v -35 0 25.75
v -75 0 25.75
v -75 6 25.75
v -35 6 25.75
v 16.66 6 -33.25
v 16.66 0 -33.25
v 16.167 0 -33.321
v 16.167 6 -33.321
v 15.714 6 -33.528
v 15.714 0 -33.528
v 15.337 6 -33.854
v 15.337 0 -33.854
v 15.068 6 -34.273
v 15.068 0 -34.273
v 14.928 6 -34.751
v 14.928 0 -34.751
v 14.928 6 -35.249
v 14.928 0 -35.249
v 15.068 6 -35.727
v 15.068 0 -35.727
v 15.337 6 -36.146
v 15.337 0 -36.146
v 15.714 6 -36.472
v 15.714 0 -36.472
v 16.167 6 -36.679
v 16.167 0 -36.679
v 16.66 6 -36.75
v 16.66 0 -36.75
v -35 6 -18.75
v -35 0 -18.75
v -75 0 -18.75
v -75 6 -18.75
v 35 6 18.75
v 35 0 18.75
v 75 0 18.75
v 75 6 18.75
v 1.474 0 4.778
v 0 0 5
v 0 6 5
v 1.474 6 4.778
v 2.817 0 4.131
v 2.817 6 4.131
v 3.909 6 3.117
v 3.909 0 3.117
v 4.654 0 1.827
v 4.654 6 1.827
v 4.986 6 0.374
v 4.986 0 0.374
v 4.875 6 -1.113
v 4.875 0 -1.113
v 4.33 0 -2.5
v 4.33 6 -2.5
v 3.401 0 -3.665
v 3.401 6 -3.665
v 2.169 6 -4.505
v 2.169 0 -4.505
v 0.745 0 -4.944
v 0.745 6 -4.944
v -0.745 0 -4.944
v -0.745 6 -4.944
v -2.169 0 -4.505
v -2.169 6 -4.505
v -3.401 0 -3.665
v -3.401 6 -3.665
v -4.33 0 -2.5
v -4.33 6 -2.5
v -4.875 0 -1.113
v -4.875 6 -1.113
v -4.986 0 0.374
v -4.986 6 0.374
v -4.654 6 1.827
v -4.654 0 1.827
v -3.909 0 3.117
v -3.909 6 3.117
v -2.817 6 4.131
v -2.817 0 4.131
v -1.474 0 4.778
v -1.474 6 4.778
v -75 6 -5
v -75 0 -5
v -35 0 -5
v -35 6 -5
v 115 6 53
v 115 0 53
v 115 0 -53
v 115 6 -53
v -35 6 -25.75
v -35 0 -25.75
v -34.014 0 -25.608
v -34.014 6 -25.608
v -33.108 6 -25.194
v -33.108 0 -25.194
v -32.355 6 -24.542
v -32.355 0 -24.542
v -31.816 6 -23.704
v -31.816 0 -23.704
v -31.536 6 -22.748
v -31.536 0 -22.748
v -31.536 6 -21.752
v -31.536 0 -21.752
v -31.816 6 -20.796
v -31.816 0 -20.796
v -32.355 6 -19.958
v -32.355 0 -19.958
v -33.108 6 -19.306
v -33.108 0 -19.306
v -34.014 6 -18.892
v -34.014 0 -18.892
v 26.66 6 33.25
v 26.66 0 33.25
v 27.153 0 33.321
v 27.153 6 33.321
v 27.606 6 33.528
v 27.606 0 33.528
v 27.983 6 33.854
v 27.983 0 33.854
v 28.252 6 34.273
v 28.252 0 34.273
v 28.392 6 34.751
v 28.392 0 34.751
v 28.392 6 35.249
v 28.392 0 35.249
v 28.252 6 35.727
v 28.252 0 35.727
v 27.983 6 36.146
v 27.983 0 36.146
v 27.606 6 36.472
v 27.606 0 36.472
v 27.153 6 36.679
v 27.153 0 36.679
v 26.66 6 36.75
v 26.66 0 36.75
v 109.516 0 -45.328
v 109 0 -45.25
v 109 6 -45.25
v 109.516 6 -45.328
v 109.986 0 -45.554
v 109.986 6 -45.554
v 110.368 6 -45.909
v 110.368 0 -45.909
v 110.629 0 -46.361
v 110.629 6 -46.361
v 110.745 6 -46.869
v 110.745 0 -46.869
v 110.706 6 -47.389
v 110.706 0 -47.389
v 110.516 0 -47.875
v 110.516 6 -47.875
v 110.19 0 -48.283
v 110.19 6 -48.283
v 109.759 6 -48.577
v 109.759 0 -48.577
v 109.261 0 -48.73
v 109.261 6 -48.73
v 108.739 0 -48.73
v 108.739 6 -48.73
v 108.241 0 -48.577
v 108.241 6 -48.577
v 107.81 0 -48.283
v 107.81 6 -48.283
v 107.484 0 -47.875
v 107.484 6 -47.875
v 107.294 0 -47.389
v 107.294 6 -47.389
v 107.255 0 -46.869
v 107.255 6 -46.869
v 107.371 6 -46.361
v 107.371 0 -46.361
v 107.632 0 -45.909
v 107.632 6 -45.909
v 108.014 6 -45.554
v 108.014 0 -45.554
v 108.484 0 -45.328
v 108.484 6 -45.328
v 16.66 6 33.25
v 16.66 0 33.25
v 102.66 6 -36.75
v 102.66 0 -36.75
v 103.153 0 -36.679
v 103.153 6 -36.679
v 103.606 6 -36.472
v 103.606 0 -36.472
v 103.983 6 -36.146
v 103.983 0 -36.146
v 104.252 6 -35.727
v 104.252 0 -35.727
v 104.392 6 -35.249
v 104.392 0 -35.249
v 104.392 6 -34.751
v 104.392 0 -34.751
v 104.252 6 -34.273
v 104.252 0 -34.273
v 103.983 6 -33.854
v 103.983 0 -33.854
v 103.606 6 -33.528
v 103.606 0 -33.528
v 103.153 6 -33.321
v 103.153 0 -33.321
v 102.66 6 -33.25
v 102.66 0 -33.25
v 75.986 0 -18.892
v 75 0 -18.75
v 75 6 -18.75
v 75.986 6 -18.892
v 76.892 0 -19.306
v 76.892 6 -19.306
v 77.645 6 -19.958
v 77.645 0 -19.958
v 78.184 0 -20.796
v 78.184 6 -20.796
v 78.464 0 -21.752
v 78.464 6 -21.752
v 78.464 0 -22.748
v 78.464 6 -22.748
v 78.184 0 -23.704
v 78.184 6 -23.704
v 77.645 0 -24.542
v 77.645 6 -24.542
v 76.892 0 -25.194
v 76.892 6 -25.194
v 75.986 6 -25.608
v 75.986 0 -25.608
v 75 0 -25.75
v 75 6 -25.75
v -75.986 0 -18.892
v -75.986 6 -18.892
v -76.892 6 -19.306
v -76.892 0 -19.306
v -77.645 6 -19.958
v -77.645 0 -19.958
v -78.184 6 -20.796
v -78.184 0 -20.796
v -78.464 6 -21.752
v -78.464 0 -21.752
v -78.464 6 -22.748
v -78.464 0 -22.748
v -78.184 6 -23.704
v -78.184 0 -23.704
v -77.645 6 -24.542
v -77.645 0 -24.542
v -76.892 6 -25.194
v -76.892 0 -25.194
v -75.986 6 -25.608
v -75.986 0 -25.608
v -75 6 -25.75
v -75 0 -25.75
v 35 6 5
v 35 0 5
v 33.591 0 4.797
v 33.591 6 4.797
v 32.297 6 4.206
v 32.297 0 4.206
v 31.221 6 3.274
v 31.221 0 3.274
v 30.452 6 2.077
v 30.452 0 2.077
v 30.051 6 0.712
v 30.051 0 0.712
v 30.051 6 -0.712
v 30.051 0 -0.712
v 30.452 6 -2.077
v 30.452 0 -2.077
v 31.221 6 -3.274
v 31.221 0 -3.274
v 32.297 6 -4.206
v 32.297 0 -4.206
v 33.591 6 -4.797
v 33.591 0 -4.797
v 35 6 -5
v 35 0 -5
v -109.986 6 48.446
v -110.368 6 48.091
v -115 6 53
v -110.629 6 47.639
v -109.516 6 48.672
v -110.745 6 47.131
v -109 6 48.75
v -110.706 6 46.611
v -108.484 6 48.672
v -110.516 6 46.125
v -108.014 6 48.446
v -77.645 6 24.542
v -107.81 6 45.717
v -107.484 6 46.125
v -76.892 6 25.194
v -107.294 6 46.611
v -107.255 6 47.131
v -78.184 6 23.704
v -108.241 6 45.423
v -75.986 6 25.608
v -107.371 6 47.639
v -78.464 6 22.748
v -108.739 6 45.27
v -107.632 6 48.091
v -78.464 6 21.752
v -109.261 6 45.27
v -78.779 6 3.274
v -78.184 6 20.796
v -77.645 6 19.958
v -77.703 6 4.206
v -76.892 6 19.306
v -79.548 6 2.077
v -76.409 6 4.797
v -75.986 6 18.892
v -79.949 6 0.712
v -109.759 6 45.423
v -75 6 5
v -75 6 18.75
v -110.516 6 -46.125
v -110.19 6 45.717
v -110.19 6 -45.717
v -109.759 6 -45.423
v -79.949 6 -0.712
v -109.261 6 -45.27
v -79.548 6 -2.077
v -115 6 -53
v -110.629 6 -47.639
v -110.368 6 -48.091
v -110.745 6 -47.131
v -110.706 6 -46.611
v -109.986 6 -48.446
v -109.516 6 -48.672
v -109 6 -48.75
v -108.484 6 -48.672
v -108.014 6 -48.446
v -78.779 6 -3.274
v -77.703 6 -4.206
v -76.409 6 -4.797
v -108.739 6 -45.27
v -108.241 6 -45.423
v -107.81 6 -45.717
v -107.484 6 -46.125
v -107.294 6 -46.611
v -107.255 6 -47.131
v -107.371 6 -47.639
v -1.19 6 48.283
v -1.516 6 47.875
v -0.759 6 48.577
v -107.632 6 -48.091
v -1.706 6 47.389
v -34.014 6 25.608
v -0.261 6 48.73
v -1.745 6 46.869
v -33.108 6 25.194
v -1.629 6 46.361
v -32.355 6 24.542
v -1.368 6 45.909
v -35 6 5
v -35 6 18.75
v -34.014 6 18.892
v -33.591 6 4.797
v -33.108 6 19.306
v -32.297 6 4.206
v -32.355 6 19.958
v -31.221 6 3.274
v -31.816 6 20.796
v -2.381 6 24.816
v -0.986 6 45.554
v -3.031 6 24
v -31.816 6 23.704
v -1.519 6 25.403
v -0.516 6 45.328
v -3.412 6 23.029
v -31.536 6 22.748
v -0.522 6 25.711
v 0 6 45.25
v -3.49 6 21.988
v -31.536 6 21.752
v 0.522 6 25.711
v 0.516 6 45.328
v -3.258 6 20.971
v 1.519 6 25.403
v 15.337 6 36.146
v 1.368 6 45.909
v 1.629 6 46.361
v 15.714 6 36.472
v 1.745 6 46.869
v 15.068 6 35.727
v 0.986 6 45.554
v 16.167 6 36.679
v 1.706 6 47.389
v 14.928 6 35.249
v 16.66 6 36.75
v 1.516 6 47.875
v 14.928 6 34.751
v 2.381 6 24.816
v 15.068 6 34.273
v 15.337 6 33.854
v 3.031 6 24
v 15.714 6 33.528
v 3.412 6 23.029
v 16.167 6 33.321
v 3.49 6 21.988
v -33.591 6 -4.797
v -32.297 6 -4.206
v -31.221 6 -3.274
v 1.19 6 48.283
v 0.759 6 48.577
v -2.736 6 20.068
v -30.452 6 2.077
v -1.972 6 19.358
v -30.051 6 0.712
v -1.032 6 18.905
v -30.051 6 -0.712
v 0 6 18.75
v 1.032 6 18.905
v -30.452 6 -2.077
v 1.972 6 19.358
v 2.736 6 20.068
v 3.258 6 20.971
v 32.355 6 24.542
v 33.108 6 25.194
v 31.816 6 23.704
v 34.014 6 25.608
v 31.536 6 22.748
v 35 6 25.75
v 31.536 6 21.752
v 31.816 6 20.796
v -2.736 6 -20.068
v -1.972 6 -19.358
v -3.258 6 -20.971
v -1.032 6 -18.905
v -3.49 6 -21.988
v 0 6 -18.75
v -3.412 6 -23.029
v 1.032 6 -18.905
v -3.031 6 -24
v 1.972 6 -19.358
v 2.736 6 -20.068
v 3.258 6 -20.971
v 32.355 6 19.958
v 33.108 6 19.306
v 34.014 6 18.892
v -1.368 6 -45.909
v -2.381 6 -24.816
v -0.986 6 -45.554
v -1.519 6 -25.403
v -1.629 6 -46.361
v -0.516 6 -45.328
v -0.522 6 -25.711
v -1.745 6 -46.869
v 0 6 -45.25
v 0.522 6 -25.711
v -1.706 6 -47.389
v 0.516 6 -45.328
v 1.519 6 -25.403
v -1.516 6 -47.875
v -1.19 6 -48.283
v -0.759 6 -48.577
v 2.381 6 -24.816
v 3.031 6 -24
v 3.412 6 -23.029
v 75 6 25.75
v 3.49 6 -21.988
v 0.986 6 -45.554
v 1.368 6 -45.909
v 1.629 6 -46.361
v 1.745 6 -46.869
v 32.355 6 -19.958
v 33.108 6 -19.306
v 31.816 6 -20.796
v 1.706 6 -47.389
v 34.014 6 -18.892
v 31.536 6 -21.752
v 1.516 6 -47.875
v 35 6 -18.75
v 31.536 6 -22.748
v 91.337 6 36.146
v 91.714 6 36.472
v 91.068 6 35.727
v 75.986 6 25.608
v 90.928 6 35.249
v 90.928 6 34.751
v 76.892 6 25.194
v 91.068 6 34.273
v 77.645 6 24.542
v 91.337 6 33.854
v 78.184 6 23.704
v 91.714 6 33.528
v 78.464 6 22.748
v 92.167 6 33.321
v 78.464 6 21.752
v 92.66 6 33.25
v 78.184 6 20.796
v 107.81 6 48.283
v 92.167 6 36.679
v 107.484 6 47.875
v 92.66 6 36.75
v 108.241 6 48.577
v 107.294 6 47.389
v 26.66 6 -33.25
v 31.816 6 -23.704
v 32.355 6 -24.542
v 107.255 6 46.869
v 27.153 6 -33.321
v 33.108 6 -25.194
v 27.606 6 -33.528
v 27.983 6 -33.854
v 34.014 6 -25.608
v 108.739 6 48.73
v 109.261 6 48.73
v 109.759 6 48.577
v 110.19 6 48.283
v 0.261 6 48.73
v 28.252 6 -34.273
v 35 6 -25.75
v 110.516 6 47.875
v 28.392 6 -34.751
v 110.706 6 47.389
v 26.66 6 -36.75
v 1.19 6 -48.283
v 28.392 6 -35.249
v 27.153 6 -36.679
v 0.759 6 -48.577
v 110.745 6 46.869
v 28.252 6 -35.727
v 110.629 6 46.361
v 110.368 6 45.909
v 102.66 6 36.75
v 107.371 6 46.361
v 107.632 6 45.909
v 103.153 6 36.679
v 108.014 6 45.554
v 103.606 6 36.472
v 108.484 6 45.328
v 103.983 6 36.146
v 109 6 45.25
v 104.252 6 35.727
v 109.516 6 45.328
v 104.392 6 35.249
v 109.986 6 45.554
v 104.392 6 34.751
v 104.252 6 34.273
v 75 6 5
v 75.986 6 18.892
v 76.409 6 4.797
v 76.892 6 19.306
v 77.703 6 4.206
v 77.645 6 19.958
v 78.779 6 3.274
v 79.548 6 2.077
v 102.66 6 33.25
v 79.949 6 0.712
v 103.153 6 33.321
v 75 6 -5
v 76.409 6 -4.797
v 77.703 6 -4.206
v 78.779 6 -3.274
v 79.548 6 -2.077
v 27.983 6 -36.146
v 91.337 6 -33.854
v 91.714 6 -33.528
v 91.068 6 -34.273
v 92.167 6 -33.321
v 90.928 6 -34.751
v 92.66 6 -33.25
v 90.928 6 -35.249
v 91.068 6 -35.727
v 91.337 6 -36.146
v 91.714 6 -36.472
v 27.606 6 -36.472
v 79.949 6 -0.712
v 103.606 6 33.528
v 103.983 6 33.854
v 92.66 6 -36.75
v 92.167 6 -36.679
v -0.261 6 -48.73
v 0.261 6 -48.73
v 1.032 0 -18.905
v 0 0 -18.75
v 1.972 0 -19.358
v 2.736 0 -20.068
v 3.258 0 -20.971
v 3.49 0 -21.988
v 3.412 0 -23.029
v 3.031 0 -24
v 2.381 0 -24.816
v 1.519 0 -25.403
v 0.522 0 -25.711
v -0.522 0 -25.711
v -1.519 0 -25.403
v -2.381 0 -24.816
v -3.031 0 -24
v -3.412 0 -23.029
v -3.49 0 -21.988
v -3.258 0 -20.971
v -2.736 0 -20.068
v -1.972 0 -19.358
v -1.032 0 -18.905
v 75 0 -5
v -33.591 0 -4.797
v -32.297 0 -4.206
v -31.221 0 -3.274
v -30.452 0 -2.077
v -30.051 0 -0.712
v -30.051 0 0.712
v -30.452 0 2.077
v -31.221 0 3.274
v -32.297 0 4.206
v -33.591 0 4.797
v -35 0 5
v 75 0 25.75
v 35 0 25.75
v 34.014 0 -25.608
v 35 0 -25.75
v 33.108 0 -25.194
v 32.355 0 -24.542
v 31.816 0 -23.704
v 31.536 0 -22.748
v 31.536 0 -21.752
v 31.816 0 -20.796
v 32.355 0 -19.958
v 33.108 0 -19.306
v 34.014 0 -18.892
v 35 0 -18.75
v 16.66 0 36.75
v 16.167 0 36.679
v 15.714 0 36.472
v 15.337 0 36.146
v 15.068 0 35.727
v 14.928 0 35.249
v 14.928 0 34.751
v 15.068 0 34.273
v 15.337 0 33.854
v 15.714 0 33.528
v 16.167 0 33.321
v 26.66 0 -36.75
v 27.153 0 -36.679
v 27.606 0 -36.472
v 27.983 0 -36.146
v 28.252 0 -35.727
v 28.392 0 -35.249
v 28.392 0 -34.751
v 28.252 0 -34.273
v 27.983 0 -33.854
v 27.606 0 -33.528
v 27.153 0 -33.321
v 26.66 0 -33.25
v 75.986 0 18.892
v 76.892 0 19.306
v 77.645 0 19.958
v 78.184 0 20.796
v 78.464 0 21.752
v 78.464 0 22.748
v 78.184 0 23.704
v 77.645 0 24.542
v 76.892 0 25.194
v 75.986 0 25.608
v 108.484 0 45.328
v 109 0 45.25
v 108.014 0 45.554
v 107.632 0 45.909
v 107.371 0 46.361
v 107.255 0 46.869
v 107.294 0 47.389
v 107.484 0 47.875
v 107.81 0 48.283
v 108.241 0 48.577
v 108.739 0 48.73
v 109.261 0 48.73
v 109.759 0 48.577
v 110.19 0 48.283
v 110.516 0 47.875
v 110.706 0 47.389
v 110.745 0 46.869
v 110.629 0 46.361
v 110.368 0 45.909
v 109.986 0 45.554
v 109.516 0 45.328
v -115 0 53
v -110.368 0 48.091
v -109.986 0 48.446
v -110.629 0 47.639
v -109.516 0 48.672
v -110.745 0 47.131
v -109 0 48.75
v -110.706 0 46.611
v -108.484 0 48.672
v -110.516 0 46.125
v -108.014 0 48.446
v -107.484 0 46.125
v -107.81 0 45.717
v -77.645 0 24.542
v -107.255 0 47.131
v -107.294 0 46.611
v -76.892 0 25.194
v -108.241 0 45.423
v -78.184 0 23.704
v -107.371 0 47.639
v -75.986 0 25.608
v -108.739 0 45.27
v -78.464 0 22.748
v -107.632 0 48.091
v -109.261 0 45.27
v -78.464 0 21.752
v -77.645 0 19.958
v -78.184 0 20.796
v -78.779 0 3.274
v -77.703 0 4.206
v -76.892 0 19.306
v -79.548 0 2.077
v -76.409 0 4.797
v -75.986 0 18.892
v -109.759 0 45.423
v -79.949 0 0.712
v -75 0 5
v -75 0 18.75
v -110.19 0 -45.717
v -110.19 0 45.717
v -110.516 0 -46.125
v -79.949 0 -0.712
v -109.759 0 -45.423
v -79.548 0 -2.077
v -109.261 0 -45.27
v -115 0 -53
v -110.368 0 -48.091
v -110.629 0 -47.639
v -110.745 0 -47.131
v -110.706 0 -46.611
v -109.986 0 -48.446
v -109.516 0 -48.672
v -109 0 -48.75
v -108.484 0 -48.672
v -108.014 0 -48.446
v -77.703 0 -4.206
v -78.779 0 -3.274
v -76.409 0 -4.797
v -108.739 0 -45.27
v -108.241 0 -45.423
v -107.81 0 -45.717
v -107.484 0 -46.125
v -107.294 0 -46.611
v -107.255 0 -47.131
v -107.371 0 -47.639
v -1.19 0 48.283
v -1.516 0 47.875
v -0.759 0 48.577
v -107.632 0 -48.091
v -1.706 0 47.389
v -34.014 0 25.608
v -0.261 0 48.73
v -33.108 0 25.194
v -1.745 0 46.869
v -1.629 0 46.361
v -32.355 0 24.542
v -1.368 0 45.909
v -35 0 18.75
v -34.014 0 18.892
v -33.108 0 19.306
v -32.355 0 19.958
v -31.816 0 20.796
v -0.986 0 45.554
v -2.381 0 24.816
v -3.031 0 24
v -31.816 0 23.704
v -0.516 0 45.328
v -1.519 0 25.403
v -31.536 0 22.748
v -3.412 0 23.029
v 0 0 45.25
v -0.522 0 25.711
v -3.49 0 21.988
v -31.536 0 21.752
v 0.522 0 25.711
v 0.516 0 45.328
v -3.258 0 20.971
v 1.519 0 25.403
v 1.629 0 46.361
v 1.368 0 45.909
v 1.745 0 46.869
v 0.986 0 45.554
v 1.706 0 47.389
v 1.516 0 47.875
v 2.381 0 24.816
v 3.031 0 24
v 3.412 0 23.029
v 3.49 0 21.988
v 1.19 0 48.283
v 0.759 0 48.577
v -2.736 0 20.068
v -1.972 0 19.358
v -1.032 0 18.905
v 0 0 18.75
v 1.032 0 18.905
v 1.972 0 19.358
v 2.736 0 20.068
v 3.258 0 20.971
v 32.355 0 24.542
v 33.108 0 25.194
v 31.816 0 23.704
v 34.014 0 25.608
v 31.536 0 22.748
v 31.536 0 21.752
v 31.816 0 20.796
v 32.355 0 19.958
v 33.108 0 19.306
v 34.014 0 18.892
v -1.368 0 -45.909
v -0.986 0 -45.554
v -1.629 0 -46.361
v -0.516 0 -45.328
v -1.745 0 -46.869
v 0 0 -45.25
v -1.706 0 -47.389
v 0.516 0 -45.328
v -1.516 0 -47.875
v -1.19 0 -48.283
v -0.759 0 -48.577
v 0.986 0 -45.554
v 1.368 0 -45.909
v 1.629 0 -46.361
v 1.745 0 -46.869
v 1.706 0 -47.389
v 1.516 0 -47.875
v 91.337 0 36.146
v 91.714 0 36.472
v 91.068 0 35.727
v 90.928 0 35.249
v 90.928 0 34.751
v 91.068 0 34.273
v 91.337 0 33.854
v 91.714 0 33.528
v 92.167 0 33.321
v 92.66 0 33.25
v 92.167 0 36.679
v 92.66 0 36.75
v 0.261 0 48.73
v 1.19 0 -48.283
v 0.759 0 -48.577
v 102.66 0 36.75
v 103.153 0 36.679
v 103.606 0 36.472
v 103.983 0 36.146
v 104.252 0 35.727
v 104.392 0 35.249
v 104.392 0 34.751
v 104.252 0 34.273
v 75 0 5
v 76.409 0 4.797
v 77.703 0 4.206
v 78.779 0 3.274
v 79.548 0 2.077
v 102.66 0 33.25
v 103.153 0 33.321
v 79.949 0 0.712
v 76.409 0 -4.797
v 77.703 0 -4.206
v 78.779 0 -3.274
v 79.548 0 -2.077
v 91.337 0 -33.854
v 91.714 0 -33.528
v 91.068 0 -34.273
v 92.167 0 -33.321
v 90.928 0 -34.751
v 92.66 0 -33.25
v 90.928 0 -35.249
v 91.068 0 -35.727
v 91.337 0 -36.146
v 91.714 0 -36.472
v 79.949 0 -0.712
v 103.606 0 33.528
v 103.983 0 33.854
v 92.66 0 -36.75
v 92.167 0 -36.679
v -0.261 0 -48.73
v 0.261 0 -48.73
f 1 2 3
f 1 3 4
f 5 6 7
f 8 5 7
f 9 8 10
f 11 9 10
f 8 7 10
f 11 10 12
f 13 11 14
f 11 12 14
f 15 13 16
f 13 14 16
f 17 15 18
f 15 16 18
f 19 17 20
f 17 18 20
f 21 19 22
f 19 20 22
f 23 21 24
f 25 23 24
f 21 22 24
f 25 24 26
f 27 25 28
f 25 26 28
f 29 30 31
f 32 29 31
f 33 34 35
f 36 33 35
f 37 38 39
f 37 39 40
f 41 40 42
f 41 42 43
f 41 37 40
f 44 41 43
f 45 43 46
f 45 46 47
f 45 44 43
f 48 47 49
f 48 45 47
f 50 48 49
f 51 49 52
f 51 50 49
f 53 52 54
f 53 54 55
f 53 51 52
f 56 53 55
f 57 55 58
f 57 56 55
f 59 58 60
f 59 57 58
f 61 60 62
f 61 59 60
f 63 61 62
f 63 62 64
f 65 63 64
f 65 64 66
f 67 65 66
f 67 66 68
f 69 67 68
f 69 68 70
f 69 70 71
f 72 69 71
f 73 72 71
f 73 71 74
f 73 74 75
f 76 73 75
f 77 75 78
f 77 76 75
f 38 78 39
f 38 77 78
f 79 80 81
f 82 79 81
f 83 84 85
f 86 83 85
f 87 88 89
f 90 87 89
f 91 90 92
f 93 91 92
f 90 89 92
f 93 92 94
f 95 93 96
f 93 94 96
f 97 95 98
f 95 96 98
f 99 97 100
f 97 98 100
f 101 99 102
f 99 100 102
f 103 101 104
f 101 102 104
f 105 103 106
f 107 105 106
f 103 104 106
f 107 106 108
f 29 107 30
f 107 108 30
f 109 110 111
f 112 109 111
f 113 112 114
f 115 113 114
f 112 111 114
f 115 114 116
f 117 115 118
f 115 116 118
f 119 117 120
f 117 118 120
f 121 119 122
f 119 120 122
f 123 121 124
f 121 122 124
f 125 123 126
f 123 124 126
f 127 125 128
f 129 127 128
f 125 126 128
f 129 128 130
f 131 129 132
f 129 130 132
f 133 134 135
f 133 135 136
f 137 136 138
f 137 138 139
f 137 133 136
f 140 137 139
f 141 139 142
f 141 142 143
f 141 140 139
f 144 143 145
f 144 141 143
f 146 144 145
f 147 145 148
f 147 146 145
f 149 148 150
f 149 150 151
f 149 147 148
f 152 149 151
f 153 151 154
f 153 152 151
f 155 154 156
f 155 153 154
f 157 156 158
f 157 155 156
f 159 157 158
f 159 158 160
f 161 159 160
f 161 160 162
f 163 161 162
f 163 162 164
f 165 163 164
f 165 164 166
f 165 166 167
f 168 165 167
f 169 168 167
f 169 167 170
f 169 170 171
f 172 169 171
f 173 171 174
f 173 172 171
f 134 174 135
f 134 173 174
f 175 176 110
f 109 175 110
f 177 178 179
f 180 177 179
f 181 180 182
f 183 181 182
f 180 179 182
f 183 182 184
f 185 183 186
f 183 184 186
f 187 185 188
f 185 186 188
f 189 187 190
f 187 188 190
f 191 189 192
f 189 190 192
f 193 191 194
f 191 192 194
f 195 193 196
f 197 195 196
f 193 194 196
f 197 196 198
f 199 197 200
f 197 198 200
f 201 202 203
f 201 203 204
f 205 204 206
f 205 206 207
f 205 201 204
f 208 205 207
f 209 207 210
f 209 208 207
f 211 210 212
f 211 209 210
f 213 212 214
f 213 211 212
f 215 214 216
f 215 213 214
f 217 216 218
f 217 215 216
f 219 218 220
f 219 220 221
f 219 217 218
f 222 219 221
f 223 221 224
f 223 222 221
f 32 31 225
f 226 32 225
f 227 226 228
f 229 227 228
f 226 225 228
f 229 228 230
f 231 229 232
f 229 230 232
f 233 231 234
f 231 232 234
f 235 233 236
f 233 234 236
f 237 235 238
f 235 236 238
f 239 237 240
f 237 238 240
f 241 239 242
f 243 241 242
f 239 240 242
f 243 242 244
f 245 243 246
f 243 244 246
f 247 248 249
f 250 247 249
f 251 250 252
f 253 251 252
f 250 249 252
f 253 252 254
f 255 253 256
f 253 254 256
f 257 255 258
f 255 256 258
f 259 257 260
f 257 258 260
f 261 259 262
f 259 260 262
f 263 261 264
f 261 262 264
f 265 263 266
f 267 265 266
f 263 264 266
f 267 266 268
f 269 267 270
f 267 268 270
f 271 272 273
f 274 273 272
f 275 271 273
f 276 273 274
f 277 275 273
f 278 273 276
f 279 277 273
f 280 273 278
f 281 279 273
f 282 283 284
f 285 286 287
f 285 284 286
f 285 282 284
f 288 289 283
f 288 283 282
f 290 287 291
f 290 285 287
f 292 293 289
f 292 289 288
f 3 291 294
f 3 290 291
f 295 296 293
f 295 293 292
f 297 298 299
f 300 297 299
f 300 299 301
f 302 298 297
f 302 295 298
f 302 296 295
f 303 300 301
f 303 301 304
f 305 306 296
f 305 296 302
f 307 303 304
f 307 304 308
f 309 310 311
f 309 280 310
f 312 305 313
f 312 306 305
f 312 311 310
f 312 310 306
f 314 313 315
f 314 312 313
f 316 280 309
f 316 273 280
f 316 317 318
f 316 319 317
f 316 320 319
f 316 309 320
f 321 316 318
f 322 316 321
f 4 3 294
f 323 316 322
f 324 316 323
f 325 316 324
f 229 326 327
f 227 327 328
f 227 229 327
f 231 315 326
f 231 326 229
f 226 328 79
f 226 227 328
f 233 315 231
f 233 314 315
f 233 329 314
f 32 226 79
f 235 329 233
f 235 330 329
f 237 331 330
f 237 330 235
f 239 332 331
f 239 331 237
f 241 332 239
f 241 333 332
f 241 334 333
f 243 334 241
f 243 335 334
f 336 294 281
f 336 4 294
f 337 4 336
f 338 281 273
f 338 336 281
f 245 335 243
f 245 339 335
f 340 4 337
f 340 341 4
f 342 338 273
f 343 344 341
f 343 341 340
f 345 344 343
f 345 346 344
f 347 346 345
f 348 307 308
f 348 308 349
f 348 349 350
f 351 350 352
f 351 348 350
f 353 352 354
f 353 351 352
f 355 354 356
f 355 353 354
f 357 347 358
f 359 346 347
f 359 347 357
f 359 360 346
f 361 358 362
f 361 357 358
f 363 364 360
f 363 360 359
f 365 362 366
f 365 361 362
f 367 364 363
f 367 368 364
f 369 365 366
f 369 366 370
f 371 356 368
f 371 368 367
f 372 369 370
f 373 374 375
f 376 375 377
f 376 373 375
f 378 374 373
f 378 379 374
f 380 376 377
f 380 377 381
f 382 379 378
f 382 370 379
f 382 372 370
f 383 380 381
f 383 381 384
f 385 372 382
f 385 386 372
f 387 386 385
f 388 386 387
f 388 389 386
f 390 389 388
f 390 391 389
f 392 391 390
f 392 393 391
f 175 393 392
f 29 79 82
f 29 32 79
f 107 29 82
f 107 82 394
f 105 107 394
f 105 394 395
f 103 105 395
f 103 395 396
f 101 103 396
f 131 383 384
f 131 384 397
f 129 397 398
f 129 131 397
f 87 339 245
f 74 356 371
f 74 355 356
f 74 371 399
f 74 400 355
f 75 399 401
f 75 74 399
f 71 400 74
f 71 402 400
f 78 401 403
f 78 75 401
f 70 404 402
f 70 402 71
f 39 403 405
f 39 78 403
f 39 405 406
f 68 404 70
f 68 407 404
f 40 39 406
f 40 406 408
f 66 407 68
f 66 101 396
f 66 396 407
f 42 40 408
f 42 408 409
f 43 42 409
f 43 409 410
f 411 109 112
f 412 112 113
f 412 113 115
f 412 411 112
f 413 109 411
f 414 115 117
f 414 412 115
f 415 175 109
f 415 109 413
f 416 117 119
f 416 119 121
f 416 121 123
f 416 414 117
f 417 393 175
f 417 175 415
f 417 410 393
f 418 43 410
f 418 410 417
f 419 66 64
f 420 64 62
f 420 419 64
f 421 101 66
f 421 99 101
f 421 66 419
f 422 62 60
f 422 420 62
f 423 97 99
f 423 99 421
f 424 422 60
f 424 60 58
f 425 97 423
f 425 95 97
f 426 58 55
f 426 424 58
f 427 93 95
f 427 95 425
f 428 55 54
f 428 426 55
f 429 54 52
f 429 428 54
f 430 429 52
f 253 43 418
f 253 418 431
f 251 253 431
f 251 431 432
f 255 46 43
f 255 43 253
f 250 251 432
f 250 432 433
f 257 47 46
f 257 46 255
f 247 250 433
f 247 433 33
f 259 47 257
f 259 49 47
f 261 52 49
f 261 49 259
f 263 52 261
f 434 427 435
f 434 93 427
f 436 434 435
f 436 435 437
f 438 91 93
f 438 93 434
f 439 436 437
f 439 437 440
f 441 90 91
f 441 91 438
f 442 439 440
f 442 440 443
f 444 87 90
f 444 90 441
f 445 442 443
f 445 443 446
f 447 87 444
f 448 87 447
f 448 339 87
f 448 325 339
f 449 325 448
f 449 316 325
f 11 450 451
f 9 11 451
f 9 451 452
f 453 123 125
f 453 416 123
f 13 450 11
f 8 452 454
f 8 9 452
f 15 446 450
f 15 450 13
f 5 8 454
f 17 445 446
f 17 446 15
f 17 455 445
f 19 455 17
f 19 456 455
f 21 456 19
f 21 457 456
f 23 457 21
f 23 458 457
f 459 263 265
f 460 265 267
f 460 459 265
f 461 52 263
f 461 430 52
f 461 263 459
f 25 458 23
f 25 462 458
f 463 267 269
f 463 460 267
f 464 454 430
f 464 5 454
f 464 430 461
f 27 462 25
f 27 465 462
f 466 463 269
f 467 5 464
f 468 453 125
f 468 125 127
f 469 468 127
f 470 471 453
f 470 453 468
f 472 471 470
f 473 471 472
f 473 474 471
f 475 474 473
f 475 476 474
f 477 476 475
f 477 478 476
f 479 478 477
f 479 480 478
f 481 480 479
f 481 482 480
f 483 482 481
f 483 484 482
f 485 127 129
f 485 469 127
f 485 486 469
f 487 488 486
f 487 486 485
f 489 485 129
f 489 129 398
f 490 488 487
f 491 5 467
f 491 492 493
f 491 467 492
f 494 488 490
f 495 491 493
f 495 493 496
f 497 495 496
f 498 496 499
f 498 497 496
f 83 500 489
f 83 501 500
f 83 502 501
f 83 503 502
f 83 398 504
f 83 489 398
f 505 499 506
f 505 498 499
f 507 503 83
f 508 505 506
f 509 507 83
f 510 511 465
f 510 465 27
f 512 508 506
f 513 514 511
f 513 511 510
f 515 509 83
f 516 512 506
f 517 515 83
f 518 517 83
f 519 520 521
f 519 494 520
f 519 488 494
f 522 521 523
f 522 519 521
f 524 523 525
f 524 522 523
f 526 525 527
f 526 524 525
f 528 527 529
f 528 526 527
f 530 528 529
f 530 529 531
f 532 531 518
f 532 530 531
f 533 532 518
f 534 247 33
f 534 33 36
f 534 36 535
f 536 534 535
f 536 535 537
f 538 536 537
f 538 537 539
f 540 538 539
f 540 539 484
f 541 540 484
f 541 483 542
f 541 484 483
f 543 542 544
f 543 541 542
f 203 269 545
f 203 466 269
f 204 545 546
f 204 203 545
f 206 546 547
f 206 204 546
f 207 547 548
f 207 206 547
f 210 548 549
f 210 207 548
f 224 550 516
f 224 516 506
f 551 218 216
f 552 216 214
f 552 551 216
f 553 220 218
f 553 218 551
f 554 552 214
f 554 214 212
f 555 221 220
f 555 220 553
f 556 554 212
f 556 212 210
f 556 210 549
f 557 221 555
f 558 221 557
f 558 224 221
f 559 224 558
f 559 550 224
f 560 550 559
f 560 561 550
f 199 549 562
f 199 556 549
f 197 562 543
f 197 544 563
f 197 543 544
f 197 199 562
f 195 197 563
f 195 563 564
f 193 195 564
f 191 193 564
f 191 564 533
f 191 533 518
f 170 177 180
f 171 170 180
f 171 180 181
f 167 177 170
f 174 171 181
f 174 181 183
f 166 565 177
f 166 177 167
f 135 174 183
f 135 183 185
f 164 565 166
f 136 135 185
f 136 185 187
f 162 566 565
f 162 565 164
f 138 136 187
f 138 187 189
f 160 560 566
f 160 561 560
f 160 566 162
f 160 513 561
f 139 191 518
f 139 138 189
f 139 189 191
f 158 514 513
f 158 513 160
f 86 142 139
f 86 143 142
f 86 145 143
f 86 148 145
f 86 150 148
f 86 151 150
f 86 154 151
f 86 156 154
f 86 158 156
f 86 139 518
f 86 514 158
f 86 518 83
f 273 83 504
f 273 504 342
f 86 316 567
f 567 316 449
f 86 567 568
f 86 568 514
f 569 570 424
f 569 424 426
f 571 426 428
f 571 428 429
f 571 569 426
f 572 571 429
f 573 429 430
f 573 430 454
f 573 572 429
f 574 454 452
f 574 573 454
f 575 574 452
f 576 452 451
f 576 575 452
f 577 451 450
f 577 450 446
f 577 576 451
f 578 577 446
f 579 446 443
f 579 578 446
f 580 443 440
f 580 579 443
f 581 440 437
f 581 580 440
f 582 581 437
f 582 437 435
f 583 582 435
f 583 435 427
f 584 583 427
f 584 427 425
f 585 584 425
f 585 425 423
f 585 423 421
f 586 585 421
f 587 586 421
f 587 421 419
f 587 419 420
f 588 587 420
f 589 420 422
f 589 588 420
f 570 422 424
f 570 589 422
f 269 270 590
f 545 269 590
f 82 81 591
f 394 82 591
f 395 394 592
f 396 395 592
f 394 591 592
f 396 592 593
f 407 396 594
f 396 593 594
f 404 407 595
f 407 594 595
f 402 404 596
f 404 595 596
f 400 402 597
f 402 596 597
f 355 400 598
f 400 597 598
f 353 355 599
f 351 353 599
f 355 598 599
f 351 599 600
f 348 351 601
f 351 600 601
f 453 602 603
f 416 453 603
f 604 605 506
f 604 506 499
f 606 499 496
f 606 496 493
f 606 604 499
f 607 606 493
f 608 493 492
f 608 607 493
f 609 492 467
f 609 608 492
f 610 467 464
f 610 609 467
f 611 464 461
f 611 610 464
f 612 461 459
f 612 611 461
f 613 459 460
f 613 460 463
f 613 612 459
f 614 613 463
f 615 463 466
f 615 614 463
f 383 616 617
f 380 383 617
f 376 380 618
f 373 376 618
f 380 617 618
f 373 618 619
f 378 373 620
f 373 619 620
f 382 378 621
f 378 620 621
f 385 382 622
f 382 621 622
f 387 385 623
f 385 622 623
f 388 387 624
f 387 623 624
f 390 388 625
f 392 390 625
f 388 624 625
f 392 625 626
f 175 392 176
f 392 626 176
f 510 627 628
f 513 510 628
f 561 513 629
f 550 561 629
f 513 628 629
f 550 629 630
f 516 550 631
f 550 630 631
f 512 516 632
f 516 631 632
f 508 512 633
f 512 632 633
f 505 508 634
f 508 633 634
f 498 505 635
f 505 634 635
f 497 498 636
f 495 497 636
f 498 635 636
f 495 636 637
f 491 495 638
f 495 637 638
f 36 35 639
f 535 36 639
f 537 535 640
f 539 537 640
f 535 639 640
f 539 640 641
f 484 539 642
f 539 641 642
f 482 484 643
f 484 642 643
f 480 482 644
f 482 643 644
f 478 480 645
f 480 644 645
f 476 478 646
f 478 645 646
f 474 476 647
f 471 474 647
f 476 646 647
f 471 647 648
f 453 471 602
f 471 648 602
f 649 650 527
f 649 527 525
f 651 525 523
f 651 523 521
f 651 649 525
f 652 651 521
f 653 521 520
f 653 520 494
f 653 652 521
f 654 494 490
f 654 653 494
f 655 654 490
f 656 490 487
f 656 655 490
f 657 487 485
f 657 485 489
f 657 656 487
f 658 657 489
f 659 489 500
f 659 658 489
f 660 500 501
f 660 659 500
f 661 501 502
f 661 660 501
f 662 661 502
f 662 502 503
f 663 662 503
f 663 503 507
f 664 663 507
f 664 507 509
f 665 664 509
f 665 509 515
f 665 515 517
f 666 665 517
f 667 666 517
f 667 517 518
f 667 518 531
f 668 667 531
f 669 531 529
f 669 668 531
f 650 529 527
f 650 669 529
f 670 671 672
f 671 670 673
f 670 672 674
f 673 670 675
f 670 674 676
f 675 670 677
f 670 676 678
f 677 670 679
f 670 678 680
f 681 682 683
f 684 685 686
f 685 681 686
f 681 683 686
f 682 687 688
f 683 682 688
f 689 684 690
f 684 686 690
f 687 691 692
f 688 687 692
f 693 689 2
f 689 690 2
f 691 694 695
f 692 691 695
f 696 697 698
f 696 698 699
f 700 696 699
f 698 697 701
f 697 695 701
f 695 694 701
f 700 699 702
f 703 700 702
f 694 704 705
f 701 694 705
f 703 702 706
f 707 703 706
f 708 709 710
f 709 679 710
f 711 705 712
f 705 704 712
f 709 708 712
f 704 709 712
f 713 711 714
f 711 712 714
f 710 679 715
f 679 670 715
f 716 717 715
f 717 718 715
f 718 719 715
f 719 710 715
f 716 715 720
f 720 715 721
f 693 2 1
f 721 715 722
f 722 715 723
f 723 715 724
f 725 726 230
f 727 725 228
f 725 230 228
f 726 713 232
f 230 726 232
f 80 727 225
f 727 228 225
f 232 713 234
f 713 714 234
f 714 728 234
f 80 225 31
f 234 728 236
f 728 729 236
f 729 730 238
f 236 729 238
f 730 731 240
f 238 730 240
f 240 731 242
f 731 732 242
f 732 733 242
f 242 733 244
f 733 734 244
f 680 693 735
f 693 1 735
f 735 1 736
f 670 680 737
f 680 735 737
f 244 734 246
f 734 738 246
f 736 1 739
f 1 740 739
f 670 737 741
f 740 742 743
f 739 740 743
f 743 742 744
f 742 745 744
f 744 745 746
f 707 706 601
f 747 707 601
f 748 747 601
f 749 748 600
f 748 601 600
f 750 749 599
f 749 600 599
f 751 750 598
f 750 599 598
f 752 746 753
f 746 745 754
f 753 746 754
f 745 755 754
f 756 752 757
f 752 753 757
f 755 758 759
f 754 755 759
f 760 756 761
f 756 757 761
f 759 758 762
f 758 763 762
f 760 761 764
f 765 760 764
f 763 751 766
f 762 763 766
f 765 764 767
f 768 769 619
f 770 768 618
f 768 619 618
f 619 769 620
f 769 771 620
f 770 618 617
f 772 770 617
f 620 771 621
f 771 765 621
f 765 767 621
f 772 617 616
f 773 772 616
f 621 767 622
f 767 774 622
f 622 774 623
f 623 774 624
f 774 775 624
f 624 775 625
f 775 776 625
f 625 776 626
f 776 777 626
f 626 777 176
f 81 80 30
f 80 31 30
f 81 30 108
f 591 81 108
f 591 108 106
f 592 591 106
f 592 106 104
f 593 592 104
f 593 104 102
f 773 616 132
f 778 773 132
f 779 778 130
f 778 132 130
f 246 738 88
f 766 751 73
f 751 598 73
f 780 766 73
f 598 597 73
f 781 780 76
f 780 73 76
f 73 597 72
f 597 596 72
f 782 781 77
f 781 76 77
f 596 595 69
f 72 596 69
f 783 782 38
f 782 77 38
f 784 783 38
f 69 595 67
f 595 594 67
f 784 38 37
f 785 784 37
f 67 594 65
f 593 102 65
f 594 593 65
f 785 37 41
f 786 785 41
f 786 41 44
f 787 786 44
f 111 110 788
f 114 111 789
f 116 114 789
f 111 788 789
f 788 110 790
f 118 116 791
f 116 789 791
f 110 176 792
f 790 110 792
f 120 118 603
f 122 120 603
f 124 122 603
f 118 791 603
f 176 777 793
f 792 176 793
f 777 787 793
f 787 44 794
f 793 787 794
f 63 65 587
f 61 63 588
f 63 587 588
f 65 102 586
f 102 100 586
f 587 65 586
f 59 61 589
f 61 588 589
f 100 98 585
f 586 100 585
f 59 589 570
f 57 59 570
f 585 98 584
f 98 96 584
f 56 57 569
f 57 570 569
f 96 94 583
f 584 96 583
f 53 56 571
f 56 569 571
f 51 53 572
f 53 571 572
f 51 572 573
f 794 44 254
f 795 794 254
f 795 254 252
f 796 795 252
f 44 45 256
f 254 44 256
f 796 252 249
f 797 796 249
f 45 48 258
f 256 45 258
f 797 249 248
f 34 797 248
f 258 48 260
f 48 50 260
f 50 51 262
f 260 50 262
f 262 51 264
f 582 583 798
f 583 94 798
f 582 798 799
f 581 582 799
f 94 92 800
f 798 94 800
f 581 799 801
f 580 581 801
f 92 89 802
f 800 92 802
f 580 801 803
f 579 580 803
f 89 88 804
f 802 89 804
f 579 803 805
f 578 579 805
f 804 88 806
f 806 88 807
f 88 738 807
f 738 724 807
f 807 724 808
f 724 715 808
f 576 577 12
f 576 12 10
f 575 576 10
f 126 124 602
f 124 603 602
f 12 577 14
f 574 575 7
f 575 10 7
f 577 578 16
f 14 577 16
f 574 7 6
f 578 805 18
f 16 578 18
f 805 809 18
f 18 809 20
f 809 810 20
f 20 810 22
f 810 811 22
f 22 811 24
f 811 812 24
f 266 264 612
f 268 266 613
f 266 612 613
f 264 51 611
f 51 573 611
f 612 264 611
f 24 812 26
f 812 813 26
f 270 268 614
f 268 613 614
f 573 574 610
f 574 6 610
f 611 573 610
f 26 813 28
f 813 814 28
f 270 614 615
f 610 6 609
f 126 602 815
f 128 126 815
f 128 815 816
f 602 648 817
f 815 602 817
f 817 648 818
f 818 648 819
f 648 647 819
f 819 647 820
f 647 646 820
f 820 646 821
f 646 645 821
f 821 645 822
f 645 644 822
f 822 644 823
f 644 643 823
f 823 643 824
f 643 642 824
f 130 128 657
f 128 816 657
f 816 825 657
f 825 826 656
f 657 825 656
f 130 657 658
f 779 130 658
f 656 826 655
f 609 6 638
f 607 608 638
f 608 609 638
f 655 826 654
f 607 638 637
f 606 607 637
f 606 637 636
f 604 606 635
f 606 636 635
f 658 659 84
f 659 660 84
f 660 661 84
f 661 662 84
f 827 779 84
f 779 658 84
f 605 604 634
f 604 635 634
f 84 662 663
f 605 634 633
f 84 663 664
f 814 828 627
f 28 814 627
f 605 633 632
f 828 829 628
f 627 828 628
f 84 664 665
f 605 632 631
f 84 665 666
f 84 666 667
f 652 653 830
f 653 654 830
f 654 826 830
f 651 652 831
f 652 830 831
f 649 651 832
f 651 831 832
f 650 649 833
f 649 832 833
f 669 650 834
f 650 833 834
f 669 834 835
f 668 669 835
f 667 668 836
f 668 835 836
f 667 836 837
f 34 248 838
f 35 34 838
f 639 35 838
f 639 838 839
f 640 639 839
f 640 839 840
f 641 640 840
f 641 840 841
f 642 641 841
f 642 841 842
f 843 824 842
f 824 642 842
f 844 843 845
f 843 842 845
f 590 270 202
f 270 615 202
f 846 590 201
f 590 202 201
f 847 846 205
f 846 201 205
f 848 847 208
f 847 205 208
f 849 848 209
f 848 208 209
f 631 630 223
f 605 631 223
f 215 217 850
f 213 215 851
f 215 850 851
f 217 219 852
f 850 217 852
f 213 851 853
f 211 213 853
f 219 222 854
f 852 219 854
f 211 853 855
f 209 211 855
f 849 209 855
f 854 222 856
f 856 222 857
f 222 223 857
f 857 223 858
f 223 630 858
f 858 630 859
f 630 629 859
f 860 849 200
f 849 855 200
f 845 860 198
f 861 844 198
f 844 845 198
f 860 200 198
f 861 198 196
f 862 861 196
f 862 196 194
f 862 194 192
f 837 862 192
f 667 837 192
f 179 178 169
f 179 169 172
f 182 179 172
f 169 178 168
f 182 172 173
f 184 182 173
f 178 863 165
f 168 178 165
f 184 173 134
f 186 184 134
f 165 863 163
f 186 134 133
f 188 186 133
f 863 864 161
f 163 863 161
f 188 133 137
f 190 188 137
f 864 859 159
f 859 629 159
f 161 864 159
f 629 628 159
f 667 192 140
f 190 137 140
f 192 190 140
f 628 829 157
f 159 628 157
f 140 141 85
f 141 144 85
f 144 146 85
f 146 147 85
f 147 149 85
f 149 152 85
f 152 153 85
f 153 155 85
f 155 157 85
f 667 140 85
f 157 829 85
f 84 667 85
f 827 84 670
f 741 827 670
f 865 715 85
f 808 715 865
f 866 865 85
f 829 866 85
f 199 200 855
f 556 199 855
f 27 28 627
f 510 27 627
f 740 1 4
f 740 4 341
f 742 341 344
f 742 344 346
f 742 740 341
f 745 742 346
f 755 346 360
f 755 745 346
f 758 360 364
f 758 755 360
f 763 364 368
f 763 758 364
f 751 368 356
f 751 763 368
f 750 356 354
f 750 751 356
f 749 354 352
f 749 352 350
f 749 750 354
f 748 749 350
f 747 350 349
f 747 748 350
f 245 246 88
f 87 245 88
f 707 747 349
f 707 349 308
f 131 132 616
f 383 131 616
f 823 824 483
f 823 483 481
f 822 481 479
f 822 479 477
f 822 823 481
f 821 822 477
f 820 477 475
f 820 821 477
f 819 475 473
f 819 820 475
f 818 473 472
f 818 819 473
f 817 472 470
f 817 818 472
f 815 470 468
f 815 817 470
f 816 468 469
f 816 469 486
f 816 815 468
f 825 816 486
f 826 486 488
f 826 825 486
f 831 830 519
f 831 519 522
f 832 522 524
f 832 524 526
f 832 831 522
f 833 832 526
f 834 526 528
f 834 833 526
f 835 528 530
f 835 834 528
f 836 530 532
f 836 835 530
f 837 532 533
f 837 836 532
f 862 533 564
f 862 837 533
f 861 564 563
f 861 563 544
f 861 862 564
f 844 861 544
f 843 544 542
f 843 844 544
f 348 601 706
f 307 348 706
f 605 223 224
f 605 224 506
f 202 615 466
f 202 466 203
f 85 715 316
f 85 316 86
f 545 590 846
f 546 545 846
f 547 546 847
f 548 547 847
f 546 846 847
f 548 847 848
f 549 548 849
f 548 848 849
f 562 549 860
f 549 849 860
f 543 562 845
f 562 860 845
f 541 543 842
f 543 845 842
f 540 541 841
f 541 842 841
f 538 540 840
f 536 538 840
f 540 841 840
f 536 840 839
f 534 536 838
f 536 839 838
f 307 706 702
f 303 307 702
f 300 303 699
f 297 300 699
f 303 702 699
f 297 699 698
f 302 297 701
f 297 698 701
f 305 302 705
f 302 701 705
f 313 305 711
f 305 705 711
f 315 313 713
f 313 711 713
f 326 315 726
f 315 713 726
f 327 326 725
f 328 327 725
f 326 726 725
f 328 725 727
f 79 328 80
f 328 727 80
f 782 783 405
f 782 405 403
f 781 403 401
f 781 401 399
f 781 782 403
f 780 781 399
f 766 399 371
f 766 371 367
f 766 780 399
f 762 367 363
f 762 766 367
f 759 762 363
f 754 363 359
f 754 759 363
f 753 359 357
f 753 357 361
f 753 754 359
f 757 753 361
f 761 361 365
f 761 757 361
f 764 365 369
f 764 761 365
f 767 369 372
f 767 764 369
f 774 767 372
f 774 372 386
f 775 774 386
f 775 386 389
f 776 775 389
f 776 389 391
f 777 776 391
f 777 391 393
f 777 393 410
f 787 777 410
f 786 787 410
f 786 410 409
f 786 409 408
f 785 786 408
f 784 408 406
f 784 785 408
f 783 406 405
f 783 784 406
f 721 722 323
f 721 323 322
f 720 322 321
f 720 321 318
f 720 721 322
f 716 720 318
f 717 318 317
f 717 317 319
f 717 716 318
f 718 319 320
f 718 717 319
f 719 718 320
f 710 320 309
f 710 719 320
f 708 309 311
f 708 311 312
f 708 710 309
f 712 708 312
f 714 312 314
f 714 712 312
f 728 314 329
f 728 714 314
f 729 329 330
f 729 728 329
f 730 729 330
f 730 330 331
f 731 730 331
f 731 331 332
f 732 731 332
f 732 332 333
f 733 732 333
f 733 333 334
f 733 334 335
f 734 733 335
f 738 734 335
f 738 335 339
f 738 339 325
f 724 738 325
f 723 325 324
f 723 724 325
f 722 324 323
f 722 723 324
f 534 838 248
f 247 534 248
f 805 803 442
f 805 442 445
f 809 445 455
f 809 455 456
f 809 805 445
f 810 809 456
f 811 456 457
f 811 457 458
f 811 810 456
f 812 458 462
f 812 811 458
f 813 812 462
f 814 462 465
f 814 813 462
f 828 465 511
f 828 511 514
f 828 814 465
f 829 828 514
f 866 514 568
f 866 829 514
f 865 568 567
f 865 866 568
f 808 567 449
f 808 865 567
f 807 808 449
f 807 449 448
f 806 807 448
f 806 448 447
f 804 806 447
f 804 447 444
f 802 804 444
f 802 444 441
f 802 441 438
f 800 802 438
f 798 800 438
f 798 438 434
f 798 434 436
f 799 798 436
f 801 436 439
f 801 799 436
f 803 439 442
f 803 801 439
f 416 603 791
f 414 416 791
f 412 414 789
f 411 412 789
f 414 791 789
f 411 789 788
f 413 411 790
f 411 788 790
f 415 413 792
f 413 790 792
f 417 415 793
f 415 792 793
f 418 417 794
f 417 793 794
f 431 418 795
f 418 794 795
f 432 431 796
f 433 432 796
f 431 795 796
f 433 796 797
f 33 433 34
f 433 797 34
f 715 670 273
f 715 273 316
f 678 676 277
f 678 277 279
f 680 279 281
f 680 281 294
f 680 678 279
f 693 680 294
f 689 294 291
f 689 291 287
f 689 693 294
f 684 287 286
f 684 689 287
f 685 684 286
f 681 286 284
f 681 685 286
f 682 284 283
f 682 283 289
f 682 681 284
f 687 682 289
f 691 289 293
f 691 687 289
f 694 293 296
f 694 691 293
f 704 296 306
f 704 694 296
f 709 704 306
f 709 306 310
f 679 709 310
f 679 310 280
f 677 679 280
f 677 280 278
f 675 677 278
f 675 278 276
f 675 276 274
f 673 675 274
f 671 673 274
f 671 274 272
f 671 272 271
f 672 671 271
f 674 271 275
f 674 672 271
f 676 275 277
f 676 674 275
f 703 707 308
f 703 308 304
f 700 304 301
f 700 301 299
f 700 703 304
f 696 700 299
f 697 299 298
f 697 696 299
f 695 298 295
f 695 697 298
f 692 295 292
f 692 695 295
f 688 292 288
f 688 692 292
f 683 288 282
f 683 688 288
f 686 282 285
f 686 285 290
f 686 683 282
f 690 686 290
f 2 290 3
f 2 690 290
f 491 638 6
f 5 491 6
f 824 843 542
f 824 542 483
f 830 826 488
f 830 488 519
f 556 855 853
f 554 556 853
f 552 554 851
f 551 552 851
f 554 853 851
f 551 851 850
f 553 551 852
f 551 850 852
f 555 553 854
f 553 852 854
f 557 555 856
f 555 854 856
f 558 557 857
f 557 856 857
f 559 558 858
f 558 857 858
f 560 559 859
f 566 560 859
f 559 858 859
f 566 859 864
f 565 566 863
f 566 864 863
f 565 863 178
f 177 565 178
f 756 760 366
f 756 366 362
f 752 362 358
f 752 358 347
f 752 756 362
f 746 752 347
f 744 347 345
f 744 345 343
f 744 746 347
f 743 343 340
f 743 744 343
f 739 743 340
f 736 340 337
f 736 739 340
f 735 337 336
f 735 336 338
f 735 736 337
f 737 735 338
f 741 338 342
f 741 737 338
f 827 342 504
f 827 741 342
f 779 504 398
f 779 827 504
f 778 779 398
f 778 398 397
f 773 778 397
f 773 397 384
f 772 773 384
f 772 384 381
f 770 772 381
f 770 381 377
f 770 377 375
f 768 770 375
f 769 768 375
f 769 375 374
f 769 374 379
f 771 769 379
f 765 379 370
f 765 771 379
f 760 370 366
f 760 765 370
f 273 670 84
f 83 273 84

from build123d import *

# Parameters (mm, degrees)
SKETCH1_W           = 230
SKETCH1_H           = 106
SKETCH1_R           = 5
SKETCH1_R_2         = 3.5
SKETCH1_R_3         = 1.75
BOSS_EXTRUDE1_DEPTH = 6


with BuildPart() as part:
    # Sketch1 → Boss-Extrude1 (new body)
    with BuildSketch(Plane(origin=(0, 0, 0), x_dir=(1, 0, 0), z_dir=(0, 1, 0))):
        Rectangle(SKETCH1_W, SKETCH1_H)
        with Locations(Location((0, 0, 0), (0, 0, 270))):
            Circle(SKETCH1_R, mode=Mode.SUBTRACT)
        with Locations(Location((0, 22.25, 0), (0, 0, 270))):
            Circle(SKETCH1_R_2, mode=Mode.SUBTRACT)
        with Locations(Location((0, -22.25, 0), (0, 0, 90))):
            Circle(SKETCH1_R_2, mode=Mode.SUBTRACT)
        with Locations(Location((109, 47, 0), (0, 0, 270))):
            Circle(SKETCH1_R_3, mode=Mode.SUBTRACT)
        with Locations(Location((109, -47, 0), (0, 0, 90))):
            Circle(SKETCH1_R_3, mode=Mode.SUBTRACT)
        with Locations(Location((-109, -47, 0), (0, 0, 270))):
            Circle(SKETCH1_R_3, mode=Mode.SUBTRACT)
        with Locations(Location((-109, 47, 0), (0, 0, 90))):
            Circle(SKETCH1_R_3, mode=Mode.SUBTRACT)
        with Locations(Location((0, 47, 0), (0, 0, 270))):
            Circle(SKETCH1_R_3, mode=Mode.SUBTRACT)
        with Locations(Location((0, -47, 0), (0, 0, 90))):
            Circle(SKETCH1_R_3, mode=Mode.SUBTRACT)
        with BuildLine():
            Line((35, 5), (75, 5))
            ThreePointArc((75, 5), (80, 0), (75, -5))
            Line((75, -5), (35, -5))
            ThreePointArc((35, -5), (30, 0), (35, 5))
        make_face(mode=Mode.SUBTRACT)
        with BuildLine():
            Line((35, 18.75), (75, 18.75))
            ThreePointArc((75, 18.75), (78.5, 22.25), (75, 25.75))
            Line((75, 25.75), (35, 25.75))
            ThreePointArc((35, 25.75), (31.5, 22.25), (35, 18.75))
        make_face(mode=Mode.SUBTRACT)
        with BuildLine():
            Line((16.66, -33.25), (26.66, -33.25))
            ThreePointArc((26.66, -33.25), (28.41, -35), (26.66, -36.75))
            Line((26.66, -36.75), (16.66, -36.75))
            ThreePointArc((16.66, -36.75), (14.91, -35), (16.66, -33.25))
        make_face(mode=Mode.SUBTRACT)
        with BuildLine():
            Line((16.66, 36.75), (26.66, 36.75))
            ThreePointArc((26.66, 36.75), (28.41, 35), (26.66, 33.25))
            Line((26.66, 33.25), (16.66, 33.25))
            ThreePointArc((16.66, 33.25), (14.91, 35), (16.66, 36.75))
        make_face(mode=Mode.SUBTRACT)
        with BuildLine():
            Line((102.66, -33.25), (92.66, -33.25))
            ThreePointArc((92.66, -33.25), (90.91, -35), (92.66, -36.75))
            Line((92.66, -36.75), (102.66, -36.75))
            ThreePointArc((102.66, -36.75), (104.41, -35), (102.66, -33.25))
        make_face(mode=Mode.SUBTRACT)
        with BuildLine():
            Line((102.66, 33.25), (92.66, 33.25))
            ThreePointArc((92.66, 33.25), (90.91, 35), (92.66, 36.75))
            Line((92.66, 36.75), (102.66, 36.75))
            ThreePointArc((102.66, 36.75), (104.41, 35), (102.66, 33.25))
        make_face(mode=Mode.SUBTRACT)
        with BuildLine():
            Line((35, -18.75), (75, -18.75))
            ThreePointArc((75, -18.75), (78.5, -22.25), (75, -25.75))
            Line((75, -25.75), (35, -25.75))
            ThreePointArc((35, -25.75), (31.5, -22.25), (35, -18.75))
        make_face(mode=Mode.SUBTRACT)
        with BuildLine():
            Line((-35, 18.75), (-75, 18.75))
            ThreePointArc((-75, 18.75), (-78.5, 22.25), (-75, 25.75))
            Line((-75, 25.75), (-35, 25.75))
            ThreePointArc((-35, 25.75), (-31.5, 22.25), (-35, 18.75))
        make_face(mode=Mode.SUBTRACT)
        with BuildLine():
            Line((-35, -5), (-75, -5))
            ThreePointArc((-75, -5), (-80, 0), (-75, 5))
            Line((-75, 5), (-35, 5))
            ThreePointArc((-35, 5), (-30, 0), (-35, -5))
        make_face(mode=Mode.SUBTRACT)
        with BuildLine():
            Line((-35, -18.75), (-75, -18.75))
            ThreePointArc((-75, -18.75), (-78.5, -22.25), (-75, -25.75))
            Line((-75, -25.75), (-35, -25.75))
            ThreePointArc((-35, -25.75), (-31.5, -22.25), (-35, -18.75))
        make_face(mode=Mode.SUBTRACT)
    extrude(amount=BOSS_EXTRUDE1_DEPTH)


solid = part.part
